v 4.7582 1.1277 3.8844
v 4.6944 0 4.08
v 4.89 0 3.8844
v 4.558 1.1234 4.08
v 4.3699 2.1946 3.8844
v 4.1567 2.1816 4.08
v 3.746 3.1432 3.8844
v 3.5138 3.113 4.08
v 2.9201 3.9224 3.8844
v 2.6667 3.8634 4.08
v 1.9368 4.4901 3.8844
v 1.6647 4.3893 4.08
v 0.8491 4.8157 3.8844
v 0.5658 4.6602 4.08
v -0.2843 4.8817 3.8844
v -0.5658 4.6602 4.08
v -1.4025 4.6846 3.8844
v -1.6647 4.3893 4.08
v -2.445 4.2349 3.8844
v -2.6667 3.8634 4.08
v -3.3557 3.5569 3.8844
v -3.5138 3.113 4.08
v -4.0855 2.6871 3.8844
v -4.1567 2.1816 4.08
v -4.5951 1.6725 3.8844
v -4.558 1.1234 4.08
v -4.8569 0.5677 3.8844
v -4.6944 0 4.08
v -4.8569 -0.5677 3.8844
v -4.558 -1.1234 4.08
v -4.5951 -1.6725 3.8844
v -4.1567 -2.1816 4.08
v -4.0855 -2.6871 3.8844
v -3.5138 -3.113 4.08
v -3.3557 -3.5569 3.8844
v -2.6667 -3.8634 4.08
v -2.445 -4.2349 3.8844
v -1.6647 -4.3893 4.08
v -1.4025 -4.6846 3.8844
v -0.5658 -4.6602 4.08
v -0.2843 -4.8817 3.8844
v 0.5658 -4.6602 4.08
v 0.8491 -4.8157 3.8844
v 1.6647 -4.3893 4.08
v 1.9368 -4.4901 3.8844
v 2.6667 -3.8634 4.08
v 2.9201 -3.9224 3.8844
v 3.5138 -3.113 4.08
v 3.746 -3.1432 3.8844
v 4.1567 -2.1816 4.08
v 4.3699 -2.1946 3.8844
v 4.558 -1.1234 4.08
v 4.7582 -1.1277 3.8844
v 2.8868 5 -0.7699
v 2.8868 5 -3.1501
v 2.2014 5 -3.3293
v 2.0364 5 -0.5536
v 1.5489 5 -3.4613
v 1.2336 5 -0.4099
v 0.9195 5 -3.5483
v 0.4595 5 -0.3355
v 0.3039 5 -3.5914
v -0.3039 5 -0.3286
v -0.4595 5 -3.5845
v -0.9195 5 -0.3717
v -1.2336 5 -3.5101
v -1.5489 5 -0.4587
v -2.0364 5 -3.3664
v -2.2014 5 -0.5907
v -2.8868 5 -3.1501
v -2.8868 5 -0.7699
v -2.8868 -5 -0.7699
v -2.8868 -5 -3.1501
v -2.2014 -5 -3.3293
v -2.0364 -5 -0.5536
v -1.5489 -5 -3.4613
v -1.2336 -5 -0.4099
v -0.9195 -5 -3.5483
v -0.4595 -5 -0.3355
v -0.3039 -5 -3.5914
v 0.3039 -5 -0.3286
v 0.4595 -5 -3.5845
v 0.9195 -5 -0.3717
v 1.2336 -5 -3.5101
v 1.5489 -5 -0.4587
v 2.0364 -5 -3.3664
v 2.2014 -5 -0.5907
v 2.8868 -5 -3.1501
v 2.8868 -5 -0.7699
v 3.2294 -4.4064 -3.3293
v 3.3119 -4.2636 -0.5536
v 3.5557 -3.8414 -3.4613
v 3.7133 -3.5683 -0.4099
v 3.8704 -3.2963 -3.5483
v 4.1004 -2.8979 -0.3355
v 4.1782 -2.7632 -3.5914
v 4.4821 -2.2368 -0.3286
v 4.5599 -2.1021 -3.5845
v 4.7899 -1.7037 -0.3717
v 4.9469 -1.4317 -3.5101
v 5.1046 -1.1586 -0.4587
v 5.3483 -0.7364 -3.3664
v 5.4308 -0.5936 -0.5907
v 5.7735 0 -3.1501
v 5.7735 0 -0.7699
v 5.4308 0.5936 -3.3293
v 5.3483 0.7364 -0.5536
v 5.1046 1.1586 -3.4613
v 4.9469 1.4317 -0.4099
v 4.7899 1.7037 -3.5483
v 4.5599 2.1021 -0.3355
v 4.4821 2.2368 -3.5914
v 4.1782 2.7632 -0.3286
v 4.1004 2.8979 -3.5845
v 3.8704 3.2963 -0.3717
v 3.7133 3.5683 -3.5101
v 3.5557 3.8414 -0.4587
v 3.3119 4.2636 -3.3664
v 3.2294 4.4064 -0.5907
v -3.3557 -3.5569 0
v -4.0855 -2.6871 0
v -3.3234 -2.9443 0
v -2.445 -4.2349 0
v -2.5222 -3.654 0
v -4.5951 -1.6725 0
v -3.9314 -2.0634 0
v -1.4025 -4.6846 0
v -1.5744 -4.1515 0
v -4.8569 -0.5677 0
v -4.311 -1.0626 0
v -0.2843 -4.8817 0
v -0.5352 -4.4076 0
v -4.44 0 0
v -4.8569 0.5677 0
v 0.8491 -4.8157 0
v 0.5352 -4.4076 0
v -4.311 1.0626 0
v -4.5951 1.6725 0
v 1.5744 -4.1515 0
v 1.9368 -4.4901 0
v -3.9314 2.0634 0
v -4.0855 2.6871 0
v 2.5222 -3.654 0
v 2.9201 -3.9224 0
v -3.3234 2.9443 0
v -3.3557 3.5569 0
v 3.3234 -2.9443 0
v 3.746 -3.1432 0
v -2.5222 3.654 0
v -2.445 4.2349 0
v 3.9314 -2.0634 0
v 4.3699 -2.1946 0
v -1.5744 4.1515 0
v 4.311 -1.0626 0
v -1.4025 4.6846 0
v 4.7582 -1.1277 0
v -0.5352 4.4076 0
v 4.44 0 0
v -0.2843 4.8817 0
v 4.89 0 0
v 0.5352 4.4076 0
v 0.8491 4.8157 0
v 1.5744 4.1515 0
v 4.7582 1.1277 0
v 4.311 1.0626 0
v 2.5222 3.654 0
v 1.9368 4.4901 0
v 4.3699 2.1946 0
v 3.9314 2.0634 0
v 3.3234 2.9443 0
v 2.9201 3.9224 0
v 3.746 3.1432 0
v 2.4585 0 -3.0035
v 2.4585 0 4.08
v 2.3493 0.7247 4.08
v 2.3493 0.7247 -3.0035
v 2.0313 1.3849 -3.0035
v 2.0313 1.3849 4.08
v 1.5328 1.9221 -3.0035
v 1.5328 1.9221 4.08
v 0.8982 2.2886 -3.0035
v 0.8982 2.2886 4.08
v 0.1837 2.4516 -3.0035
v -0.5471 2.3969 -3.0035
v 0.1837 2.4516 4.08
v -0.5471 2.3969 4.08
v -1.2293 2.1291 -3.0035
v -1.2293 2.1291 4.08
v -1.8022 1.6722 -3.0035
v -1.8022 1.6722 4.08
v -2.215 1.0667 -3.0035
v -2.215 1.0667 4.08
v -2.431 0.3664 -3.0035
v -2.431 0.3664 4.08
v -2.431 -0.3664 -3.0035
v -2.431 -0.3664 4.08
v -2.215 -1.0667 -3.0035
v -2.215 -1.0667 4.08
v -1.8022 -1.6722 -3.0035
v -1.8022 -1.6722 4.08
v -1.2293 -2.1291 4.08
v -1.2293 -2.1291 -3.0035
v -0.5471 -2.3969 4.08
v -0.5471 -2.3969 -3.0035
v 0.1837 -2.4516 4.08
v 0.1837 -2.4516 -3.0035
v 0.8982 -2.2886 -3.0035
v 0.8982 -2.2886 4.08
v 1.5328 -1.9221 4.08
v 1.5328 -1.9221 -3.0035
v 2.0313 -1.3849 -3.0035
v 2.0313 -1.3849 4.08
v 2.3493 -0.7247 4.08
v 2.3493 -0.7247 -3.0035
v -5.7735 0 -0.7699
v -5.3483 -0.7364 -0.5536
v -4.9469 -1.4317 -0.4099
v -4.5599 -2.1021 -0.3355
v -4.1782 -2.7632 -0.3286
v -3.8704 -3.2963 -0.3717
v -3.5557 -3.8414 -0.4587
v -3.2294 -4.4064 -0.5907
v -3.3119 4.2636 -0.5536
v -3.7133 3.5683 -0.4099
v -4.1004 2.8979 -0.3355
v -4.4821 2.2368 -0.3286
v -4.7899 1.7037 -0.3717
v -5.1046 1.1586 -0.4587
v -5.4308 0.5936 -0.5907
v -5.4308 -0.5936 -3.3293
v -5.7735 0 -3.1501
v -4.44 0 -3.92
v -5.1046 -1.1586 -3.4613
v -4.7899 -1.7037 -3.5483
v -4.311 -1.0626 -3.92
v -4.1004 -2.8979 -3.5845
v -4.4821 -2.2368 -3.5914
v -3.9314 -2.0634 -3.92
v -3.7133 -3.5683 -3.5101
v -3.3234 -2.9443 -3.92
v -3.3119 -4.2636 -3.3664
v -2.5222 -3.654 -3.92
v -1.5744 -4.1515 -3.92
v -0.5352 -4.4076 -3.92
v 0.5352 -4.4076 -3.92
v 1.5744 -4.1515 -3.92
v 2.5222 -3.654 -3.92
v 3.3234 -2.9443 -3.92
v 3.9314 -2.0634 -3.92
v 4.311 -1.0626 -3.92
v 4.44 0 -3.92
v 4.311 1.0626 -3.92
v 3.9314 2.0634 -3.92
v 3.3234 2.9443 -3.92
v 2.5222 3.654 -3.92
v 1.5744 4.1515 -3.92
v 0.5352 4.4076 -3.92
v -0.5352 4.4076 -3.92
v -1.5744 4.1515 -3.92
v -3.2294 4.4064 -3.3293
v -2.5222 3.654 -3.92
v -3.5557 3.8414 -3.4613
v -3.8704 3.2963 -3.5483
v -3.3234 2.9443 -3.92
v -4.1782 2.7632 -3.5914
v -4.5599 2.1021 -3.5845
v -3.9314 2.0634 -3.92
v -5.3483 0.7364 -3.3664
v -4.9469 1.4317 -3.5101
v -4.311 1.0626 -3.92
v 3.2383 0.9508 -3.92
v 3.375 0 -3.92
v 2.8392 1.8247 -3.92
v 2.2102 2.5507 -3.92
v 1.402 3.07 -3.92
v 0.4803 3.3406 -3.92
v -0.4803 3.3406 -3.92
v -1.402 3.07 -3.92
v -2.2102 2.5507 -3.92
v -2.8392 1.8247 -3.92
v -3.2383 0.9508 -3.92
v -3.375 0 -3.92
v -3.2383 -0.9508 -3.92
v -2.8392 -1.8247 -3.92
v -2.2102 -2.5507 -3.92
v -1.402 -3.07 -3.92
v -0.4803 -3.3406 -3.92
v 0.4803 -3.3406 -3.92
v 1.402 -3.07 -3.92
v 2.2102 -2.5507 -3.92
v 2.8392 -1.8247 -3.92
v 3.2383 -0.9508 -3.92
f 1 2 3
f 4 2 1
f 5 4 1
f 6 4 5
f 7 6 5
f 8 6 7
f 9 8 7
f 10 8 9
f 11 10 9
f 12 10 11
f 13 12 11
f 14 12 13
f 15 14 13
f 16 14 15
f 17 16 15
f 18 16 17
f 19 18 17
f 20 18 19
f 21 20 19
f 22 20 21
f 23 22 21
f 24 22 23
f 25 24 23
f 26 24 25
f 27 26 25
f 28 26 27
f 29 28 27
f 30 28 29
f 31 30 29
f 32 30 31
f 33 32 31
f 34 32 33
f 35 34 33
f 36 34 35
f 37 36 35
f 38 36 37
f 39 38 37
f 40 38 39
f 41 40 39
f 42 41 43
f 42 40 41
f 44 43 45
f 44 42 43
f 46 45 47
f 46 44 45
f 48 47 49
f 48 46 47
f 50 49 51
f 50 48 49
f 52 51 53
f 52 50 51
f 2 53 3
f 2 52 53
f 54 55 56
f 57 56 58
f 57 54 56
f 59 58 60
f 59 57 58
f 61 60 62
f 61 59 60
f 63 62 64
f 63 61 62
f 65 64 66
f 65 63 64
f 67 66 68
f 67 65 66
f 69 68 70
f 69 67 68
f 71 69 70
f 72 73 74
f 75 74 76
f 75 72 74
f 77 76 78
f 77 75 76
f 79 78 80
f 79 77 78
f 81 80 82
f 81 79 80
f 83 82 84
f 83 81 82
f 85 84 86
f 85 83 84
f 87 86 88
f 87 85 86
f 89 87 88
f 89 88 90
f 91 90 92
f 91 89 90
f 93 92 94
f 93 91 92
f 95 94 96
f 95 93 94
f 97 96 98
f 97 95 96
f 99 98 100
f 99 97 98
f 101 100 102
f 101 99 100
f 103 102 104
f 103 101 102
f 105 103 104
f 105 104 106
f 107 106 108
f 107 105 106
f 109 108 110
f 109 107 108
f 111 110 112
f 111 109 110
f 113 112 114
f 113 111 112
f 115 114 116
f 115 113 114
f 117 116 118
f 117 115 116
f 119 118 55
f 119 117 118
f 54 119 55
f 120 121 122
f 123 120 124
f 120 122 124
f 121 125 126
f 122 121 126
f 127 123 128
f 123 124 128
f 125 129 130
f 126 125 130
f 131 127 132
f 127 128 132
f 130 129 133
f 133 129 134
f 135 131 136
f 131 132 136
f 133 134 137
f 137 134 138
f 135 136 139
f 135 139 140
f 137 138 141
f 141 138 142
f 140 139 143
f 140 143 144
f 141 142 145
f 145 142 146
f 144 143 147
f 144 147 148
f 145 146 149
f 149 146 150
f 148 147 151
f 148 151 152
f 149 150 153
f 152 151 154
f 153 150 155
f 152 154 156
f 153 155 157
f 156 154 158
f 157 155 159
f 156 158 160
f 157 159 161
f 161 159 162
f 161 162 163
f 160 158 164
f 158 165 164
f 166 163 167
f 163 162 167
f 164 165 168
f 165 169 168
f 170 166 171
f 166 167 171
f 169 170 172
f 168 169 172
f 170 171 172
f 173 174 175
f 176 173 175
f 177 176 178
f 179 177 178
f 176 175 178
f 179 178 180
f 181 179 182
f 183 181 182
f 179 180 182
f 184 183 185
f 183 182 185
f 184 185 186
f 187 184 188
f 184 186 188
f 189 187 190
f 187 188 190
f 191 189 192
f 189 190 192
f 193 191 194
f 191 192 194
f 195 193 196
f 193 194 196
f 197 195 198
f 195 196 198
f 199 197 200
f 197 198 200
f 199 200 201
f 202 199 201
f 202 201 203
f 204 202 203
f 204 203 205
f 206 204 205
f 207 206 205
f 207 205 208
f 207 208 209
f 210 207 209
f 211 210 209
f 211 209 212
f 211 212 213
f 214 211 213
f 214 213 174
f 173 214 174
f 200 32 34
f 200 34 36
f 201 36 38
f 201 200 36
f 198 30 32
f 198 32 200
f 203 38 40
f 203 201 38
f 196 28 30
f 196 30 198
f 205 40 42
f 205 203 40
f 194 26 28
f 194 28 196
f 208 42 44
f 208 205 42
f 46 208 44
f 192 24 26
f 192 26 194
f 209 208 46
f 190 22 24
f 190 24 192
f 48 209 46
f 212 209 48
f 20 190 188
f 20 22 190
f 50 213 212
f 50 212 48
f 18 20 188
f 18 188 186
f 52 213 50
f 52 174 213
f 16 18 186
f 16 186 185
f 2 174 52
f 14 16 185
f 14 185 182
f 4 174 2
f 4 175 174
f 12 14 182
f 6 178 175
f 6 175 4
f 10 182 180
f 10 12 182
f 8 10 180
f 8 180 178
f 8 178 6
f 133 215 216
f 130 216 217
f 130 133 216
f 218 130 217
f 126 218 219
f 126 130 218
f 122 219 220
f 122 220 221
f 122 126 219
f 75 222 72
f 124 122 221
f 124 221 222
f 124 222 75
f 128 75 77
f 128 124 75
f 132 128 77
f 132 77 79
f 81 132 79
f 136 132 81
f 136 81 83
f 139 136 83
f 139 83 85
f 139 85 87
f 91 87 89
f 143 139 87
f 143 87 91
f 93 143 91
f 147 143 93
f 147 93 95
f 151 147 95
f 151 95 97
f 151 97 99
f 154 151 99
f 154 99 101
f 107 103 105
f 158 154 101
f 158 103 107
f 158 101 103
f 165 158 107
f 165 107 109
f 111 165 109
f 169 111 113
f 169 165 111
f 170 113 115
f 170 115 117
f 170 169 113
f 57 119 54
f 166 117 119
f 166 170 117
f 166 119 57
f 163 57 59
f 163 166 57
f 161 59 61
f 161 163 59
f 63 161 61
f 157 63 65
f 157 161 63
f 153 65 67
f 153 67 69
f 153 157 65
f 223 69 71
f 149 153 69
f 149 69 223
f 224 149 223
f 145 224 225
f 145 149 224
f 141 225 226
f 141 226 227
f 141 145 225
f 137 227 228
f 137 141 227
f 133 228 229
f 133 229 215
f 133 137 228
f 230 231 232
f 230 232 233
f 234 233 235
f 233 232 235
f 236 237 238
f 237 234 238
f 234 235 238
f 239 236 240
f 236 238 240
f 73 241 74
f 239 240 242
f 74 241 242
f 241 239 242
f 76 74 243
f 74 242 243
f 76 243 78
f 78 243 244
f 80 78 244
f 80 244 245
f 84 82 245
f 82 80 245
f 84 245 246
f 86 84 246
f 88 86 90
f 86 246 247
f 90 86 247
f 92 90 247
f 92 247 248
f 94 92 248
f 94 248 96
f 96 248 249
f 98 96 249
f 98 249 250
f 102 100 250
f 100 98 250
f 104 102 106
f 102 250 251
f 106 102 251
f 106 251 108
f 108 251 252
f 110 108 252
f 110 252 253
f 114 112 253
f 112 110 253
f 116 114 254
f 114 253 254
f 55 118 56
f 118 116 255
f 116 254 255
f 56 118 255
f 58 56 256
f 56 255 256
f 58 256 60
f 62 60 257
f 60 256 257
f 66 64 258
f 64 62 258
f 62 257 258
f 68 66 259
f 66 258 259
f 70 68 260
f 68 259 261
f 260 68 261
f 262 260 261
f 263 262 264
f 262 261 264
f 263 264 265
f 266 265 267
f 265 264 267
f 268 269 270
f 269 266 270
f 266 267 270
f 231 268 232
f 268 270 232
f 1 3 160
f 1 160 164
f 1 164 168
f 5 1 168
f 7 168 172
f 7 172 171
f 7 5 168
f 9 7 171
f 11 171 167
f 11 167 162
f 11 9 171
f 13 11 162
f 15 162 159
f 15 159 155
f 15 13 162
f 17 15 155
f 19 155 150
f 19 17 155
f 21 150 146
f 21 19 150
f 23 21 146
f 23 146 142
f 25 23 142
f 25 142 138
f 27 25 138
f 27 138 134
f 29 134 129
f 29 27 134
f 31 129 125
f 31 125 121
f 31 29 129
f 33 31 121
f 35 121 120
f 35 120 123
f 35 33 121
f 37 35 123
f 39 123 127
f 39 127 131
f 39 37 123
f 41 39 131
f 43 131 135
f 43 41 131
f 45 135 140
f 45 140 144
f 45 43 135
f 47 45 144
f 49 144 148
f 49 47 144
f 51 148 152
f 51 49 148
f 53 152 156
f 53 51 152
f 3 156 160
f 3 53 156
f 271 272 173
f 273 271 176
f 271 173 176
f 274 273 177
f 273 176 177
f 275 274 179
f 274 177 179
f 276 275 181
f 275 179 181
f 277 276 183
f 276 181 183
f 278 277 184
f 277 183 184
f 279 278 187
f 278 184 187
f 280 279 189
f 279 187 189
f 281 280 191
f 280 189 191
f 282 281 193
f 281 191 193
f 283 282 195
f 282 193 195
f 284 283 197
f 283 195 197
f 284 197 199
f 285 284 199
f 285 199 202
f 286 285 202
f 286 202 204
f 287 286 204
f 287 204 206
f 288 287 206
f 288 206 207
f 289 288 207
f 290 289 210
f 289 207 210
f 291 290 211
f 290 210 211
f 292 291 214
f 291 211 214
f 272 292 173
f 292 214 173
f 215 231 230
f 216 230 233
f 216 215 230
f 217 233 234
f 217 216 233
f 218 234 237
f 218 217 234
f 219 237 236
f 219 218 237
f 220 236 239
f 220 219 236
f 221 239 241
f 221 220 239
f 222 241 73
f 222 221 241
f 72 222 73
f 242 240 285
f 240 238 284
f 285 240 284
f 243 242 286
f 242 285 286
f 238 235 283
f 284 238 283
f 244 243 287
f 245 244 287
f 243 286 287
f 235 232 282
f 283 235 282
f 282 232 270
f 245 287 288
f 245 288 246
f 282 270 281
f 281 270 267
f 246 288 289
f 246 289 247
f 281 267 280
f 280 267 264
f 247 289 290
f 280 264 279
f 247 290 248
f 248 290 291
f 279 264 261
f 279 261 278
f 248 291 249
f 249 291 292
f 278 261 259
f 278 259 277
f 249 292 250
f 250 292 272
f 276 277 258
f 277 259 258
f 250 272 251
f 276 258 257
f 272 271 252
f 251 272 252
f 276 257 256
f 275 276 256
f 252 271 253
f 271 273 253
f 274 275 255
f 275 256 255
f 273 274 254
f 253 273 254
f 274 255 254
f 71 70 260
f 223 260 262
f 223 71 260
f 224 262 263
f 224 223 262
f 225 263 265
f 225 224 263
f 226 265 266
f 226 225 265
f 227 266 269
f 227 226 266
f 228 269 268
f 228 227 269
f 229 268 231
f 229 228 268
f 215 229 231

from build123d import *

# Parameters (mm, degrees)
SKETCH1_R      = 2.4585
BASENUT_DEPTH  = 3.92
EXTRUDE1_START = 4.08
SKETCH2_R      = 4.89
SKETCH2_R_2    = 2.4585
EXTRUDE1_DEPTH = 4.08
CHAMFER1_SIZE  = 0.1956


with BuildPart() as part:
    # Sketch1 → BaseNut (new body)
    with BuildSketch(Plane.XY):
        Polygon((2.886751346, -5), (5.773502692, 0), (2.886751346, 5), (-2.886751346, 5), (-5.773502692, 0), (-2.886751346, -5), align=None)
        Circle(SKETCH1_R, mode=Mode.SUBTRACT)
    extrude(amount=-BASENUT_DEPTH)

    # Sketch3 → Double-Chamfer (revolve, cut)
    with BuildSketch(Plane(origin=(0, 0, 0), x_dir=(1, 0, 0), z_dir=(0, 1, 0)), mode=Mode.PRIVATE) as double_chamfer_sk:
        Polygon((4.44, 3.92), (5.773502692, 3.92), (5.773502692, 3.150101862), align=None)
        Polygon((5.773502692, 0.769898138), (4.44, 0), (5.773502692, 0), align=None)
    revolve(double_chamfer_sk.sketch.rotate(Axis((0, 0, -16.31077227), (0, 0, 1)), 179.999999973), axis=Axis((0, 0, -16.31077227), (0, 0, 1)), mode=Mode.SUBTRACT)

    # Sketch2 → Extrude1 (add)
    with BuildSketch(Plane(origin=(20.087129569, -4.281493882, 0), x_dir=(1, 0, 0), z_dir=(0, 0, 1)).offset(EXTRUDE1_START)):
        with Locations((-20.087129569, 4.281493882)):
            Circle(SKETCH2_R)
        with Locations((-20.087129569, 4.281493882)):
            Circle(SKETCH2_R_2, mode=Mode.SUBTRACT)
    extrude(amount=-EXTRUDE1_DEPTH)

    # Sketch5 → EndChamfer (revolve, cut)
    with BuildSketch(Plane(origin=(0, 0, 0), x_dir=(1, 0, 0), z_dir=(0, 1, 0))):
        Polygon((2.4585, 3.92), (3.375, 3.92), (2.4585, 3.0035), align=None)
    revolve(axis=Axis((0, 0, -16.800797033), (0, 0, 1)), mode=Mode.SUBTRACT)

    # Chamfer1
    chamfer1_edges = [part.edges().sort_by_distance(p)[0] for p in [
        (-4.89, 0, 4.08),
    ]]
    chamfer(chamfer1_edges, length=CHAMFER1_SIZE)


solid = part.part
